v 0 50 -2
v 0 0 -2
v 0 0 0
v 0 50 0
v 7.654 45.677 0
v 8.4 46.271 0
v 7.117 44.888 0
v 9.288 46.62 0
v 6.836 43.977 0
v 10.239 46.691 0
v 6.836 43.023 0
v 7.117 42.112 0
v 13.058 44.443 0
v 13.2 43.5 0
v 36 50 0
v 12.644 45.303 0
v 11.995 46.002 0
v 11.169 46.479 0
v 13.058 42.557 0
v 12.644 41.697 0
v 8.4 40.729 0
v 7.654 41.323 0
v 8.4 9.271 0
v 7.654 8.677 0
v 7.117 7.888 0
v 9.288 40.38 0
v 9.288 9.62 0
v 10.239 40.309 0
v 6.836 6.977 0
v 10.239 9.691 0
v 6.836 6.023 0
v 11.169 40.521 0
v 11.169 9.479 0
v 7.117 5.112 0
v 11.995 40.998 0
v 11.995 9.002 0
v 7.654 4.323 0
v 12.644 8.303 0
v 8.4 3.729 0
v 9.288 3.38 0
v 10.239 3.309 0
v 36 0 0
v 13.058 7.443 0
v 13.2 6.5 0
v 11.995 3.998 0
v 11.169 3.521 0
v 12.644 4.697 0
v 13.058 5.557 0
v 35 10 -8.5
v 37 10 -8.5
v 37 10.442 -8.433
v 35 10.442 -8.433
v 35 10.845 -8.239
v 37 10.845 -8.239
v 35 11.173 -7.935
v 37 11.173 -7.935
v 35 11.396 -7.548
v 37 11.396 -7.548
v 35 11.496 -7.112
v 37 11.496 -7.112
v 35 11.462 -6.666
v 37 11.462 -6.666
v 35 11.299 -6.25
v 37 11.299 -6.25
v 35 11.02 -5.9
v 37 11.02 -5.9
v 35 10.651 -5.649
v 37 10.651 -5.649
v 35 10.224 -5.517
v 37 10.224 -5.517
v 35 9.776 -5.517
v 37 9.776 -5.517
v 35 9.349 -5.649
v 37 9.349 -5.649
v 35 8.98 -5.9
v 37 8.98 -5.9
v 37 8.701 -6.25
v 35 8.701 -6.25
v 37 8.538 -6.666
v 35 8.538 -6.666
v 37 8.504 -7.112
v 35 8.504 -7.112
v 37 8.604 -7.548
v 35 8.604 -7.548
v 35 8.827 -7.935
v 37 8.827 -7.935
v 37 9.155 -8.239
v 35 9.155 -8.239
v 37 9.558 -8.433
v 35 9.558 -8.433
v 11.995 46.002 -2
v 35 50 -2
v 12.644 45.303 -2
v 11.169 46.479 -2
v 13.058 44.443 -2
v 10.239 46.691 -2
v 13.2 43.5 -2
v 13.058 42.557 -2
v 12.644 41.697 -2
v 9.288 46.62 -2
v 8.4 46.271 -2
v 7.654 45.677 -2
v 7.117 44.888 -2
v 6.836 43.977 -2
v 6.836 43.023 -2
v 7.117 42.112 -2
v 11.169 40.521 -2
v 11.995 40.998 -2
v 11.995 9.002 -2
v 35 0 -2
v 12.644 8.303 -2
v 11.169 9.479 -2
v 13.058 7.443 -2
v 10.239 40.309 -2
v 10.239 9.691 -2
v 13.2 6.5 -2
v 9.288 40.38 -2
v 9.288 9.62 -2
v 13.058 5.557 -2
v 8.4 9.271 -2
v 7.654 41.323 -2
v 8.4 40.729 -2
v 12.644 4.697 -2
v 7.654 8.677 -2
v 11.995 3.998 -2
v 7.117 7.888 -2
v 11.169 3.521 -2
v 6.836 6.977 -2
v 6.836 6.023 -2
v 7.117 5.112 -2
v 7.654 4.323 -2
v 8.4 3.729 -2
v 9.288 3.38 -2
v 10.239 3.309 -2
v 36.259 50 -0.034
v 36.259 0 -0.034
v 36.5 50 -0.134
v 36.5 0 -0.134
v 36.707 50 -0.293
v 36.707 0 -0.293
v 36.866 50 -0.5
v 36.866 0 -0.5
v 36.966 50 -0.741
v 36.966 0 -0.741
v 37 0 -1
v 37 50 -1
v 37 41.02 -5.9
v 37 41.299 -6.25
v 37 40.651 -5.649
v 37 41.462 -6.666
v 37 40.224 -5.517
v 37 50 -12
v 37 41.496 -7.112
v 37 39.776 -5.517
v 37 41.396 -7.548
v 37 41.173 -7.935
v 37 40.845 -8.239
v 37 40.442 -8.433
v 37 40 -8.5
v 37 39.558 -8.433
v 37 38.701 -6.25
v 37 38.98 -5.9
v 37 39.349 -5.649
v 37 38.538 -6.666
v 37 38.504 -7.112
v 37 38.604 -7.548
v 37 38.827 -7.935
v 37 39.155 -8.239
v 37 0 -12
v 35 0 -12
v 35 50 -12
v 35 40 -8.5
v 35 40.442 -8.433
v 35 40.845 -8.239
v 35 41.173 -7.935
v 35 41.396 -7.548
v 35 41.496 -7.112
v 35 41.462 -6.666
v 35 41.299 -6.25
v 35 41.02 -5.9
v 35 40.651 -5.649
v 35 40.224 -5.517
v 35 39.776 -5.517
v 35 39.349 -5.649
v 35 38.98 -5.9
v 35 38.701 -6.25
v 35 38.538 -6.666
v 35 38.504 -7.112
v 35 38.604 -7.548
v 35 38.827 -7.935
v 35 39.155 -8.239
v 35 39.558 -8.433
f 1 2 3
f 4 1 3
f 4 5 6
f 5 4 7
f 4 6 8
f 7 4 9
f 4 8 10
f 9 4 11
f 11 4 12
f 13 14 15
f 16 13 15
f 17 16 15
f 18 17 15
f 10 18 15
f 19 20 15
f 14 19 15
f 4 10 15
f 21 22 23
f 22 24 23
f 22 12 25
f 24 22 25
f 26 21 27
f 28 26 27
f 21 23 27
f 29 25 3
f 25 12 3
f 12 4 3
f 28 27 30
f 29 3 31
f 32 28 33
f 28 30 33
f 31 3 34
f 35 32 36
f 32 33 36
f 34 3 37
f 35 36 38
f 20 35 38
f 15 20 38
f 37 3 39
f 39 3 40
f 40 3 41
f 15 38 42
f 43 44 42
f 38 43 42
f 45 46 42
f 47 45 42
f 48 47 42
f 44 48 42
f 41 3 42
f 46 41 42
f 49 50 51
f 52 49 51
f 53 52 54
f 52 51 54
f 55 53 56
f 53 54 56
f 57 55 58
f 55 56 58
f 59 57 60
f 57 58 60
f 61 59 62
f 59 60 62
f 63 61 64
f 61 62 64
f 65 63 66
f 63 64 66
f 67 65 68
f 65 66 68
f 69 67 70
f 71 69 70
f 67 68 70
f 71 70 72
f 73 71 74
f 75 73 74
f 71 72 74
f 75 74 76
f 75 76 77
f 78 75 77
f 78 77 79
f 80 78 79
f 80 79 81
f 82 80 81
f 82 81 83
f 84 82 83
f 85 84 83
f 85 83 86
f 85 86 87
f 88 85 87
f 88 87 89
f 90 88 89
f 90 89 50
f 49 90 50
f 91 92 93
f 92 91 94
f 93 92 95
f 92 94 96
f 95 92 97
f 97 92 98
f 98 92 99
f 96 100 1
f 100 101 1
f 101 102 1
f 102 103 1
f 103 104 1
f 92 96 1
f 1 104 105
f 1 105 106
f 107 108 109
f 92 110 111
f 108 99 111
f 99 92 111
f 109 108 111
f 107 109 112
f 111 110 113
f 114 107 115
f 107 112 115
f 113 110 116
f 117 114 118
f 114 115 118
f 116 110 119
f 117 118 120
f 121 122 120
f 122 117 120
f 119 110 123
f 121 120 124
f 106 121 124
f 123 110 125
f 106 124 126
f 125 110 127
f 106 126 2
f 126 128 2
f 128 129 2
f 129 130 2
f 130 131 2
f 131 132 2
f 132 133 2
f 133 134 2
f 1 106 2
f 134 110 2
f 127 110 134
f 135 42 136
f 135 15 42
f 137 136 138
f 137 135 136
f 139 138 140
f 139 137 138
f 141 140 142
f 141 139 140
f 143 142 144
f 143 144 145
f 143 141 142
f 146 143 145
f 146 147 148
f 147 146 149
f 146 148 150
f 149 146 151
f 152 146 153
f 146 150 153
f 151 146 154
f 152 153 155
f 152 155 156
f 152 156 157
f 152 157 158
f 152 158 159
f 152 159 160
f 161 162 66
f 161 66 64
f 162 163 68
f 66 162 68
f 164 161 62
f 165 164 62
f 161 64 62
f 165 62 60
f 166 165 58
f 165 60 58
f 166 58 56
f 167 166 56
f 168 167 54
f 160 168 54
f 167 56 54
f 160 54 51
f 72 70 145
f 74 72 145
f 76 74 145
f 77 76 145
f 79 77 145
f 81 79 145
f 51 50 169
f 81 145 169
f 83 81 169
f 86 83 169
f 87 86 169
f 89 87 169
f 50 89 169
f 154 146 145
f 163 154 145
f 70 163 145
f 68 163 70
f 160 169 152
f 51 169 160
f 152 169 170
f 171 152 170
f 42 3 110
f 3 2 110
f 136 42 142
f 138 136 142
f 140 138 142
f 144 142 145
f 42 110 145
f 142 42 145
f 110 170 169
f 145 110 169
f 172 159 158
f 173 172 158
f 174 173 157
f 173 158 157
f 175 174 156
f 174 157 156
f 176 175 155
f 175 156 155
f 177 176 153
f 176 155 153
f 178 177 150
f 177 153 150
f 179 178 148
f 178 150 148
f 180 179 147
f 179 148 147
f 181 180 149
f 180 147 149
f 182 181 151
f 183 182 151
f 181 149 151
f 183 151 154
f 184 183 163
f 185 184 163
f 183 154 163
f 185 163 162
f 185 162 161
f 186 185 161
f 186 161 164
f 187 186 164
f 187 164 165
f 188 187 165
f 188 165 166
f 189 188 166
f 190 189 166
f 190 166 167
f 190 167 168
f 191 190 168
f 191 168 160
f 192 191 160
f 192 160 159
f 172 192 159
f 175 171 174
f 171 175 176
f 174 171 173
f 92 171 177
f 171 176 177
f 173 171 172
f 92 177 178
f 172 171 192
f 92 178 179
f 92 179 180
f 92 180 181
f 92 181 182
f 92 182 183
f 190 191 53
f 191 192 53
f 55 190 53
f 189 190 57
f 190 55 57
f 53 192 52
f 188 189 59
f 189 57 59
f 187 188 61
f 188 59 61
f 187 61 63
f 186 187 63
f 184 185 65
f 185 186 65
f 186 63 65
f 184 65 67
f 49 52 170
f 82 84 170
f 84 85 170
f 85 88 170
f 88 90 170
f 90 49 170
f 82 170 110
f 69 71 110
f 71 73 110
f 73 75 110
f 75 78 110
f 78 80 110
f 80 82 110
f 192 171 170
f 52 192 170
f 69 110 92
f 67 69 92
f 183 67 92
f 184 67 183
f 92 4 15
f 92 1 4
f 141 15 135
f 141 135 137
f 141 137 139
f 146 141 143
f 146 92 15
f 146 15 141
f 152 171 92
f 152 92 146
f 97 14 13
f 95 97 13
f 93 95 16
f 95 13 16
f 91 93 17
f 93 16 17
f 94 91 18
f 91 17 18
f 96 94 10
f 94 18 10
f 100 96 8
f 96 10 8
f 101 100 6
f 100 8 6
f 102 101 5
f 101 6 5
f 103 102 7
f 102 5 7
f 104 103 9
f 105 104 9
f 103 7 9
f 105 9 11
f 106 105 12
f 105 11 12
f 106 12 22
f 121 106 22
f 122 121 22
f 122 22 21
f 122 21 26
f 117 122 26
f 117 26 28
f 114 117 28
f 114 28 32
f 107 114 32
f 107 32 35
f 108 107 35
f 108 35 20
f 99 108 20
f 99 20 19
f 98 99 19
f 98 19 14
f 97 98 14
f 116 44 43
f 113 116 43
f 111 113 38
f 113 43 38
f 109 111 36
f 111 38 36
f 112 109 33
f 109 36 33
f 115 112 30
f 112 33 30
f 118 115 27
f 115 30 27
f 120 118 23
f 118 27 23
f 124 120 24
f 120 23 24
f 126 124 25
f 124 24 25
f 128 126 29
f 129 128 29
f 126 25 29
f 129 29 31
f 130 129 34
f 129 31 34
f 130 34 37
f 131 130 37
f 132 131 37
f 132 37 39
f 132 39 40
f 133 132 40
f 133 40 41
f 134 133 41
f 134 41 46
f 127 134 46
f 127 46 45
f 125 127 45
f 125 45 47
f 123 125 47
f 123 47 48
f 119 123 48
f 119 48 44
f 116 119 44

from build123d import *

# Parameters (mm, degrees)
BOSS_EXTRUDE1_DEPTH = 50
FILLET2_R           = 1
SKETCH4_R           = 1.5
CUT_EXTRUDE1_DEPTH  = 64.348243859
SKETCH5_R           = 3.2
CUT_EXTRUDE2_DEPTH  = 64.348243859


with BuildPart() as part:
    # Sketch3 → Boss-Extrude1 (new body)
    with BuildSketch(Plane(origin=(0, 0, 0), x_dir=(1, 0, 0), z_dir=(0, 1, 0))):
        Polygon((0, 0), (37, 0), (37, 12), (35, 12), (35, 2), (0, 2), align=None)
    extrude(amount=BOSS_EXTRUDE1_DEPTH)

    # Fillet2
    fillet2_edges = [part.edges().sort_by_distance(p)[0] for p in [
        (37, 25, 0),
    ]]
    fillet(fillet2_edges, radius=FILLET2_R)

    # Sketch4 → Cut-Extrude1 (cut, through all)
    with BuildSketch(Plane(origin=(37, 0, 0), x_dir=(0, 0, -1), z_dir=(1, 0, 0))):
        with Locations((7, 40)):
            Circle(SKETCH4_R)
        with Locations((7, 10)):
            Circle(SKETCH4_R)
    extrude(amount=-CUT_EXTRUDE1_DEPTH, mode=Mode.SUBTRACT)

    # Sketch5 → Cut-Extrude2 (cut, through all)
    with BuildSketch(Plane.XY):
        with Locations((10, 43.5)):
            Circle(SKETCH5_R)
        with Locations((10, 6.5)):
            Circle(SKETCH5_R)
    extrude(amount=-CUT_EXTRUDE2_DEPTH, mode=Mode.SUBTRACT)


solid = part.part
